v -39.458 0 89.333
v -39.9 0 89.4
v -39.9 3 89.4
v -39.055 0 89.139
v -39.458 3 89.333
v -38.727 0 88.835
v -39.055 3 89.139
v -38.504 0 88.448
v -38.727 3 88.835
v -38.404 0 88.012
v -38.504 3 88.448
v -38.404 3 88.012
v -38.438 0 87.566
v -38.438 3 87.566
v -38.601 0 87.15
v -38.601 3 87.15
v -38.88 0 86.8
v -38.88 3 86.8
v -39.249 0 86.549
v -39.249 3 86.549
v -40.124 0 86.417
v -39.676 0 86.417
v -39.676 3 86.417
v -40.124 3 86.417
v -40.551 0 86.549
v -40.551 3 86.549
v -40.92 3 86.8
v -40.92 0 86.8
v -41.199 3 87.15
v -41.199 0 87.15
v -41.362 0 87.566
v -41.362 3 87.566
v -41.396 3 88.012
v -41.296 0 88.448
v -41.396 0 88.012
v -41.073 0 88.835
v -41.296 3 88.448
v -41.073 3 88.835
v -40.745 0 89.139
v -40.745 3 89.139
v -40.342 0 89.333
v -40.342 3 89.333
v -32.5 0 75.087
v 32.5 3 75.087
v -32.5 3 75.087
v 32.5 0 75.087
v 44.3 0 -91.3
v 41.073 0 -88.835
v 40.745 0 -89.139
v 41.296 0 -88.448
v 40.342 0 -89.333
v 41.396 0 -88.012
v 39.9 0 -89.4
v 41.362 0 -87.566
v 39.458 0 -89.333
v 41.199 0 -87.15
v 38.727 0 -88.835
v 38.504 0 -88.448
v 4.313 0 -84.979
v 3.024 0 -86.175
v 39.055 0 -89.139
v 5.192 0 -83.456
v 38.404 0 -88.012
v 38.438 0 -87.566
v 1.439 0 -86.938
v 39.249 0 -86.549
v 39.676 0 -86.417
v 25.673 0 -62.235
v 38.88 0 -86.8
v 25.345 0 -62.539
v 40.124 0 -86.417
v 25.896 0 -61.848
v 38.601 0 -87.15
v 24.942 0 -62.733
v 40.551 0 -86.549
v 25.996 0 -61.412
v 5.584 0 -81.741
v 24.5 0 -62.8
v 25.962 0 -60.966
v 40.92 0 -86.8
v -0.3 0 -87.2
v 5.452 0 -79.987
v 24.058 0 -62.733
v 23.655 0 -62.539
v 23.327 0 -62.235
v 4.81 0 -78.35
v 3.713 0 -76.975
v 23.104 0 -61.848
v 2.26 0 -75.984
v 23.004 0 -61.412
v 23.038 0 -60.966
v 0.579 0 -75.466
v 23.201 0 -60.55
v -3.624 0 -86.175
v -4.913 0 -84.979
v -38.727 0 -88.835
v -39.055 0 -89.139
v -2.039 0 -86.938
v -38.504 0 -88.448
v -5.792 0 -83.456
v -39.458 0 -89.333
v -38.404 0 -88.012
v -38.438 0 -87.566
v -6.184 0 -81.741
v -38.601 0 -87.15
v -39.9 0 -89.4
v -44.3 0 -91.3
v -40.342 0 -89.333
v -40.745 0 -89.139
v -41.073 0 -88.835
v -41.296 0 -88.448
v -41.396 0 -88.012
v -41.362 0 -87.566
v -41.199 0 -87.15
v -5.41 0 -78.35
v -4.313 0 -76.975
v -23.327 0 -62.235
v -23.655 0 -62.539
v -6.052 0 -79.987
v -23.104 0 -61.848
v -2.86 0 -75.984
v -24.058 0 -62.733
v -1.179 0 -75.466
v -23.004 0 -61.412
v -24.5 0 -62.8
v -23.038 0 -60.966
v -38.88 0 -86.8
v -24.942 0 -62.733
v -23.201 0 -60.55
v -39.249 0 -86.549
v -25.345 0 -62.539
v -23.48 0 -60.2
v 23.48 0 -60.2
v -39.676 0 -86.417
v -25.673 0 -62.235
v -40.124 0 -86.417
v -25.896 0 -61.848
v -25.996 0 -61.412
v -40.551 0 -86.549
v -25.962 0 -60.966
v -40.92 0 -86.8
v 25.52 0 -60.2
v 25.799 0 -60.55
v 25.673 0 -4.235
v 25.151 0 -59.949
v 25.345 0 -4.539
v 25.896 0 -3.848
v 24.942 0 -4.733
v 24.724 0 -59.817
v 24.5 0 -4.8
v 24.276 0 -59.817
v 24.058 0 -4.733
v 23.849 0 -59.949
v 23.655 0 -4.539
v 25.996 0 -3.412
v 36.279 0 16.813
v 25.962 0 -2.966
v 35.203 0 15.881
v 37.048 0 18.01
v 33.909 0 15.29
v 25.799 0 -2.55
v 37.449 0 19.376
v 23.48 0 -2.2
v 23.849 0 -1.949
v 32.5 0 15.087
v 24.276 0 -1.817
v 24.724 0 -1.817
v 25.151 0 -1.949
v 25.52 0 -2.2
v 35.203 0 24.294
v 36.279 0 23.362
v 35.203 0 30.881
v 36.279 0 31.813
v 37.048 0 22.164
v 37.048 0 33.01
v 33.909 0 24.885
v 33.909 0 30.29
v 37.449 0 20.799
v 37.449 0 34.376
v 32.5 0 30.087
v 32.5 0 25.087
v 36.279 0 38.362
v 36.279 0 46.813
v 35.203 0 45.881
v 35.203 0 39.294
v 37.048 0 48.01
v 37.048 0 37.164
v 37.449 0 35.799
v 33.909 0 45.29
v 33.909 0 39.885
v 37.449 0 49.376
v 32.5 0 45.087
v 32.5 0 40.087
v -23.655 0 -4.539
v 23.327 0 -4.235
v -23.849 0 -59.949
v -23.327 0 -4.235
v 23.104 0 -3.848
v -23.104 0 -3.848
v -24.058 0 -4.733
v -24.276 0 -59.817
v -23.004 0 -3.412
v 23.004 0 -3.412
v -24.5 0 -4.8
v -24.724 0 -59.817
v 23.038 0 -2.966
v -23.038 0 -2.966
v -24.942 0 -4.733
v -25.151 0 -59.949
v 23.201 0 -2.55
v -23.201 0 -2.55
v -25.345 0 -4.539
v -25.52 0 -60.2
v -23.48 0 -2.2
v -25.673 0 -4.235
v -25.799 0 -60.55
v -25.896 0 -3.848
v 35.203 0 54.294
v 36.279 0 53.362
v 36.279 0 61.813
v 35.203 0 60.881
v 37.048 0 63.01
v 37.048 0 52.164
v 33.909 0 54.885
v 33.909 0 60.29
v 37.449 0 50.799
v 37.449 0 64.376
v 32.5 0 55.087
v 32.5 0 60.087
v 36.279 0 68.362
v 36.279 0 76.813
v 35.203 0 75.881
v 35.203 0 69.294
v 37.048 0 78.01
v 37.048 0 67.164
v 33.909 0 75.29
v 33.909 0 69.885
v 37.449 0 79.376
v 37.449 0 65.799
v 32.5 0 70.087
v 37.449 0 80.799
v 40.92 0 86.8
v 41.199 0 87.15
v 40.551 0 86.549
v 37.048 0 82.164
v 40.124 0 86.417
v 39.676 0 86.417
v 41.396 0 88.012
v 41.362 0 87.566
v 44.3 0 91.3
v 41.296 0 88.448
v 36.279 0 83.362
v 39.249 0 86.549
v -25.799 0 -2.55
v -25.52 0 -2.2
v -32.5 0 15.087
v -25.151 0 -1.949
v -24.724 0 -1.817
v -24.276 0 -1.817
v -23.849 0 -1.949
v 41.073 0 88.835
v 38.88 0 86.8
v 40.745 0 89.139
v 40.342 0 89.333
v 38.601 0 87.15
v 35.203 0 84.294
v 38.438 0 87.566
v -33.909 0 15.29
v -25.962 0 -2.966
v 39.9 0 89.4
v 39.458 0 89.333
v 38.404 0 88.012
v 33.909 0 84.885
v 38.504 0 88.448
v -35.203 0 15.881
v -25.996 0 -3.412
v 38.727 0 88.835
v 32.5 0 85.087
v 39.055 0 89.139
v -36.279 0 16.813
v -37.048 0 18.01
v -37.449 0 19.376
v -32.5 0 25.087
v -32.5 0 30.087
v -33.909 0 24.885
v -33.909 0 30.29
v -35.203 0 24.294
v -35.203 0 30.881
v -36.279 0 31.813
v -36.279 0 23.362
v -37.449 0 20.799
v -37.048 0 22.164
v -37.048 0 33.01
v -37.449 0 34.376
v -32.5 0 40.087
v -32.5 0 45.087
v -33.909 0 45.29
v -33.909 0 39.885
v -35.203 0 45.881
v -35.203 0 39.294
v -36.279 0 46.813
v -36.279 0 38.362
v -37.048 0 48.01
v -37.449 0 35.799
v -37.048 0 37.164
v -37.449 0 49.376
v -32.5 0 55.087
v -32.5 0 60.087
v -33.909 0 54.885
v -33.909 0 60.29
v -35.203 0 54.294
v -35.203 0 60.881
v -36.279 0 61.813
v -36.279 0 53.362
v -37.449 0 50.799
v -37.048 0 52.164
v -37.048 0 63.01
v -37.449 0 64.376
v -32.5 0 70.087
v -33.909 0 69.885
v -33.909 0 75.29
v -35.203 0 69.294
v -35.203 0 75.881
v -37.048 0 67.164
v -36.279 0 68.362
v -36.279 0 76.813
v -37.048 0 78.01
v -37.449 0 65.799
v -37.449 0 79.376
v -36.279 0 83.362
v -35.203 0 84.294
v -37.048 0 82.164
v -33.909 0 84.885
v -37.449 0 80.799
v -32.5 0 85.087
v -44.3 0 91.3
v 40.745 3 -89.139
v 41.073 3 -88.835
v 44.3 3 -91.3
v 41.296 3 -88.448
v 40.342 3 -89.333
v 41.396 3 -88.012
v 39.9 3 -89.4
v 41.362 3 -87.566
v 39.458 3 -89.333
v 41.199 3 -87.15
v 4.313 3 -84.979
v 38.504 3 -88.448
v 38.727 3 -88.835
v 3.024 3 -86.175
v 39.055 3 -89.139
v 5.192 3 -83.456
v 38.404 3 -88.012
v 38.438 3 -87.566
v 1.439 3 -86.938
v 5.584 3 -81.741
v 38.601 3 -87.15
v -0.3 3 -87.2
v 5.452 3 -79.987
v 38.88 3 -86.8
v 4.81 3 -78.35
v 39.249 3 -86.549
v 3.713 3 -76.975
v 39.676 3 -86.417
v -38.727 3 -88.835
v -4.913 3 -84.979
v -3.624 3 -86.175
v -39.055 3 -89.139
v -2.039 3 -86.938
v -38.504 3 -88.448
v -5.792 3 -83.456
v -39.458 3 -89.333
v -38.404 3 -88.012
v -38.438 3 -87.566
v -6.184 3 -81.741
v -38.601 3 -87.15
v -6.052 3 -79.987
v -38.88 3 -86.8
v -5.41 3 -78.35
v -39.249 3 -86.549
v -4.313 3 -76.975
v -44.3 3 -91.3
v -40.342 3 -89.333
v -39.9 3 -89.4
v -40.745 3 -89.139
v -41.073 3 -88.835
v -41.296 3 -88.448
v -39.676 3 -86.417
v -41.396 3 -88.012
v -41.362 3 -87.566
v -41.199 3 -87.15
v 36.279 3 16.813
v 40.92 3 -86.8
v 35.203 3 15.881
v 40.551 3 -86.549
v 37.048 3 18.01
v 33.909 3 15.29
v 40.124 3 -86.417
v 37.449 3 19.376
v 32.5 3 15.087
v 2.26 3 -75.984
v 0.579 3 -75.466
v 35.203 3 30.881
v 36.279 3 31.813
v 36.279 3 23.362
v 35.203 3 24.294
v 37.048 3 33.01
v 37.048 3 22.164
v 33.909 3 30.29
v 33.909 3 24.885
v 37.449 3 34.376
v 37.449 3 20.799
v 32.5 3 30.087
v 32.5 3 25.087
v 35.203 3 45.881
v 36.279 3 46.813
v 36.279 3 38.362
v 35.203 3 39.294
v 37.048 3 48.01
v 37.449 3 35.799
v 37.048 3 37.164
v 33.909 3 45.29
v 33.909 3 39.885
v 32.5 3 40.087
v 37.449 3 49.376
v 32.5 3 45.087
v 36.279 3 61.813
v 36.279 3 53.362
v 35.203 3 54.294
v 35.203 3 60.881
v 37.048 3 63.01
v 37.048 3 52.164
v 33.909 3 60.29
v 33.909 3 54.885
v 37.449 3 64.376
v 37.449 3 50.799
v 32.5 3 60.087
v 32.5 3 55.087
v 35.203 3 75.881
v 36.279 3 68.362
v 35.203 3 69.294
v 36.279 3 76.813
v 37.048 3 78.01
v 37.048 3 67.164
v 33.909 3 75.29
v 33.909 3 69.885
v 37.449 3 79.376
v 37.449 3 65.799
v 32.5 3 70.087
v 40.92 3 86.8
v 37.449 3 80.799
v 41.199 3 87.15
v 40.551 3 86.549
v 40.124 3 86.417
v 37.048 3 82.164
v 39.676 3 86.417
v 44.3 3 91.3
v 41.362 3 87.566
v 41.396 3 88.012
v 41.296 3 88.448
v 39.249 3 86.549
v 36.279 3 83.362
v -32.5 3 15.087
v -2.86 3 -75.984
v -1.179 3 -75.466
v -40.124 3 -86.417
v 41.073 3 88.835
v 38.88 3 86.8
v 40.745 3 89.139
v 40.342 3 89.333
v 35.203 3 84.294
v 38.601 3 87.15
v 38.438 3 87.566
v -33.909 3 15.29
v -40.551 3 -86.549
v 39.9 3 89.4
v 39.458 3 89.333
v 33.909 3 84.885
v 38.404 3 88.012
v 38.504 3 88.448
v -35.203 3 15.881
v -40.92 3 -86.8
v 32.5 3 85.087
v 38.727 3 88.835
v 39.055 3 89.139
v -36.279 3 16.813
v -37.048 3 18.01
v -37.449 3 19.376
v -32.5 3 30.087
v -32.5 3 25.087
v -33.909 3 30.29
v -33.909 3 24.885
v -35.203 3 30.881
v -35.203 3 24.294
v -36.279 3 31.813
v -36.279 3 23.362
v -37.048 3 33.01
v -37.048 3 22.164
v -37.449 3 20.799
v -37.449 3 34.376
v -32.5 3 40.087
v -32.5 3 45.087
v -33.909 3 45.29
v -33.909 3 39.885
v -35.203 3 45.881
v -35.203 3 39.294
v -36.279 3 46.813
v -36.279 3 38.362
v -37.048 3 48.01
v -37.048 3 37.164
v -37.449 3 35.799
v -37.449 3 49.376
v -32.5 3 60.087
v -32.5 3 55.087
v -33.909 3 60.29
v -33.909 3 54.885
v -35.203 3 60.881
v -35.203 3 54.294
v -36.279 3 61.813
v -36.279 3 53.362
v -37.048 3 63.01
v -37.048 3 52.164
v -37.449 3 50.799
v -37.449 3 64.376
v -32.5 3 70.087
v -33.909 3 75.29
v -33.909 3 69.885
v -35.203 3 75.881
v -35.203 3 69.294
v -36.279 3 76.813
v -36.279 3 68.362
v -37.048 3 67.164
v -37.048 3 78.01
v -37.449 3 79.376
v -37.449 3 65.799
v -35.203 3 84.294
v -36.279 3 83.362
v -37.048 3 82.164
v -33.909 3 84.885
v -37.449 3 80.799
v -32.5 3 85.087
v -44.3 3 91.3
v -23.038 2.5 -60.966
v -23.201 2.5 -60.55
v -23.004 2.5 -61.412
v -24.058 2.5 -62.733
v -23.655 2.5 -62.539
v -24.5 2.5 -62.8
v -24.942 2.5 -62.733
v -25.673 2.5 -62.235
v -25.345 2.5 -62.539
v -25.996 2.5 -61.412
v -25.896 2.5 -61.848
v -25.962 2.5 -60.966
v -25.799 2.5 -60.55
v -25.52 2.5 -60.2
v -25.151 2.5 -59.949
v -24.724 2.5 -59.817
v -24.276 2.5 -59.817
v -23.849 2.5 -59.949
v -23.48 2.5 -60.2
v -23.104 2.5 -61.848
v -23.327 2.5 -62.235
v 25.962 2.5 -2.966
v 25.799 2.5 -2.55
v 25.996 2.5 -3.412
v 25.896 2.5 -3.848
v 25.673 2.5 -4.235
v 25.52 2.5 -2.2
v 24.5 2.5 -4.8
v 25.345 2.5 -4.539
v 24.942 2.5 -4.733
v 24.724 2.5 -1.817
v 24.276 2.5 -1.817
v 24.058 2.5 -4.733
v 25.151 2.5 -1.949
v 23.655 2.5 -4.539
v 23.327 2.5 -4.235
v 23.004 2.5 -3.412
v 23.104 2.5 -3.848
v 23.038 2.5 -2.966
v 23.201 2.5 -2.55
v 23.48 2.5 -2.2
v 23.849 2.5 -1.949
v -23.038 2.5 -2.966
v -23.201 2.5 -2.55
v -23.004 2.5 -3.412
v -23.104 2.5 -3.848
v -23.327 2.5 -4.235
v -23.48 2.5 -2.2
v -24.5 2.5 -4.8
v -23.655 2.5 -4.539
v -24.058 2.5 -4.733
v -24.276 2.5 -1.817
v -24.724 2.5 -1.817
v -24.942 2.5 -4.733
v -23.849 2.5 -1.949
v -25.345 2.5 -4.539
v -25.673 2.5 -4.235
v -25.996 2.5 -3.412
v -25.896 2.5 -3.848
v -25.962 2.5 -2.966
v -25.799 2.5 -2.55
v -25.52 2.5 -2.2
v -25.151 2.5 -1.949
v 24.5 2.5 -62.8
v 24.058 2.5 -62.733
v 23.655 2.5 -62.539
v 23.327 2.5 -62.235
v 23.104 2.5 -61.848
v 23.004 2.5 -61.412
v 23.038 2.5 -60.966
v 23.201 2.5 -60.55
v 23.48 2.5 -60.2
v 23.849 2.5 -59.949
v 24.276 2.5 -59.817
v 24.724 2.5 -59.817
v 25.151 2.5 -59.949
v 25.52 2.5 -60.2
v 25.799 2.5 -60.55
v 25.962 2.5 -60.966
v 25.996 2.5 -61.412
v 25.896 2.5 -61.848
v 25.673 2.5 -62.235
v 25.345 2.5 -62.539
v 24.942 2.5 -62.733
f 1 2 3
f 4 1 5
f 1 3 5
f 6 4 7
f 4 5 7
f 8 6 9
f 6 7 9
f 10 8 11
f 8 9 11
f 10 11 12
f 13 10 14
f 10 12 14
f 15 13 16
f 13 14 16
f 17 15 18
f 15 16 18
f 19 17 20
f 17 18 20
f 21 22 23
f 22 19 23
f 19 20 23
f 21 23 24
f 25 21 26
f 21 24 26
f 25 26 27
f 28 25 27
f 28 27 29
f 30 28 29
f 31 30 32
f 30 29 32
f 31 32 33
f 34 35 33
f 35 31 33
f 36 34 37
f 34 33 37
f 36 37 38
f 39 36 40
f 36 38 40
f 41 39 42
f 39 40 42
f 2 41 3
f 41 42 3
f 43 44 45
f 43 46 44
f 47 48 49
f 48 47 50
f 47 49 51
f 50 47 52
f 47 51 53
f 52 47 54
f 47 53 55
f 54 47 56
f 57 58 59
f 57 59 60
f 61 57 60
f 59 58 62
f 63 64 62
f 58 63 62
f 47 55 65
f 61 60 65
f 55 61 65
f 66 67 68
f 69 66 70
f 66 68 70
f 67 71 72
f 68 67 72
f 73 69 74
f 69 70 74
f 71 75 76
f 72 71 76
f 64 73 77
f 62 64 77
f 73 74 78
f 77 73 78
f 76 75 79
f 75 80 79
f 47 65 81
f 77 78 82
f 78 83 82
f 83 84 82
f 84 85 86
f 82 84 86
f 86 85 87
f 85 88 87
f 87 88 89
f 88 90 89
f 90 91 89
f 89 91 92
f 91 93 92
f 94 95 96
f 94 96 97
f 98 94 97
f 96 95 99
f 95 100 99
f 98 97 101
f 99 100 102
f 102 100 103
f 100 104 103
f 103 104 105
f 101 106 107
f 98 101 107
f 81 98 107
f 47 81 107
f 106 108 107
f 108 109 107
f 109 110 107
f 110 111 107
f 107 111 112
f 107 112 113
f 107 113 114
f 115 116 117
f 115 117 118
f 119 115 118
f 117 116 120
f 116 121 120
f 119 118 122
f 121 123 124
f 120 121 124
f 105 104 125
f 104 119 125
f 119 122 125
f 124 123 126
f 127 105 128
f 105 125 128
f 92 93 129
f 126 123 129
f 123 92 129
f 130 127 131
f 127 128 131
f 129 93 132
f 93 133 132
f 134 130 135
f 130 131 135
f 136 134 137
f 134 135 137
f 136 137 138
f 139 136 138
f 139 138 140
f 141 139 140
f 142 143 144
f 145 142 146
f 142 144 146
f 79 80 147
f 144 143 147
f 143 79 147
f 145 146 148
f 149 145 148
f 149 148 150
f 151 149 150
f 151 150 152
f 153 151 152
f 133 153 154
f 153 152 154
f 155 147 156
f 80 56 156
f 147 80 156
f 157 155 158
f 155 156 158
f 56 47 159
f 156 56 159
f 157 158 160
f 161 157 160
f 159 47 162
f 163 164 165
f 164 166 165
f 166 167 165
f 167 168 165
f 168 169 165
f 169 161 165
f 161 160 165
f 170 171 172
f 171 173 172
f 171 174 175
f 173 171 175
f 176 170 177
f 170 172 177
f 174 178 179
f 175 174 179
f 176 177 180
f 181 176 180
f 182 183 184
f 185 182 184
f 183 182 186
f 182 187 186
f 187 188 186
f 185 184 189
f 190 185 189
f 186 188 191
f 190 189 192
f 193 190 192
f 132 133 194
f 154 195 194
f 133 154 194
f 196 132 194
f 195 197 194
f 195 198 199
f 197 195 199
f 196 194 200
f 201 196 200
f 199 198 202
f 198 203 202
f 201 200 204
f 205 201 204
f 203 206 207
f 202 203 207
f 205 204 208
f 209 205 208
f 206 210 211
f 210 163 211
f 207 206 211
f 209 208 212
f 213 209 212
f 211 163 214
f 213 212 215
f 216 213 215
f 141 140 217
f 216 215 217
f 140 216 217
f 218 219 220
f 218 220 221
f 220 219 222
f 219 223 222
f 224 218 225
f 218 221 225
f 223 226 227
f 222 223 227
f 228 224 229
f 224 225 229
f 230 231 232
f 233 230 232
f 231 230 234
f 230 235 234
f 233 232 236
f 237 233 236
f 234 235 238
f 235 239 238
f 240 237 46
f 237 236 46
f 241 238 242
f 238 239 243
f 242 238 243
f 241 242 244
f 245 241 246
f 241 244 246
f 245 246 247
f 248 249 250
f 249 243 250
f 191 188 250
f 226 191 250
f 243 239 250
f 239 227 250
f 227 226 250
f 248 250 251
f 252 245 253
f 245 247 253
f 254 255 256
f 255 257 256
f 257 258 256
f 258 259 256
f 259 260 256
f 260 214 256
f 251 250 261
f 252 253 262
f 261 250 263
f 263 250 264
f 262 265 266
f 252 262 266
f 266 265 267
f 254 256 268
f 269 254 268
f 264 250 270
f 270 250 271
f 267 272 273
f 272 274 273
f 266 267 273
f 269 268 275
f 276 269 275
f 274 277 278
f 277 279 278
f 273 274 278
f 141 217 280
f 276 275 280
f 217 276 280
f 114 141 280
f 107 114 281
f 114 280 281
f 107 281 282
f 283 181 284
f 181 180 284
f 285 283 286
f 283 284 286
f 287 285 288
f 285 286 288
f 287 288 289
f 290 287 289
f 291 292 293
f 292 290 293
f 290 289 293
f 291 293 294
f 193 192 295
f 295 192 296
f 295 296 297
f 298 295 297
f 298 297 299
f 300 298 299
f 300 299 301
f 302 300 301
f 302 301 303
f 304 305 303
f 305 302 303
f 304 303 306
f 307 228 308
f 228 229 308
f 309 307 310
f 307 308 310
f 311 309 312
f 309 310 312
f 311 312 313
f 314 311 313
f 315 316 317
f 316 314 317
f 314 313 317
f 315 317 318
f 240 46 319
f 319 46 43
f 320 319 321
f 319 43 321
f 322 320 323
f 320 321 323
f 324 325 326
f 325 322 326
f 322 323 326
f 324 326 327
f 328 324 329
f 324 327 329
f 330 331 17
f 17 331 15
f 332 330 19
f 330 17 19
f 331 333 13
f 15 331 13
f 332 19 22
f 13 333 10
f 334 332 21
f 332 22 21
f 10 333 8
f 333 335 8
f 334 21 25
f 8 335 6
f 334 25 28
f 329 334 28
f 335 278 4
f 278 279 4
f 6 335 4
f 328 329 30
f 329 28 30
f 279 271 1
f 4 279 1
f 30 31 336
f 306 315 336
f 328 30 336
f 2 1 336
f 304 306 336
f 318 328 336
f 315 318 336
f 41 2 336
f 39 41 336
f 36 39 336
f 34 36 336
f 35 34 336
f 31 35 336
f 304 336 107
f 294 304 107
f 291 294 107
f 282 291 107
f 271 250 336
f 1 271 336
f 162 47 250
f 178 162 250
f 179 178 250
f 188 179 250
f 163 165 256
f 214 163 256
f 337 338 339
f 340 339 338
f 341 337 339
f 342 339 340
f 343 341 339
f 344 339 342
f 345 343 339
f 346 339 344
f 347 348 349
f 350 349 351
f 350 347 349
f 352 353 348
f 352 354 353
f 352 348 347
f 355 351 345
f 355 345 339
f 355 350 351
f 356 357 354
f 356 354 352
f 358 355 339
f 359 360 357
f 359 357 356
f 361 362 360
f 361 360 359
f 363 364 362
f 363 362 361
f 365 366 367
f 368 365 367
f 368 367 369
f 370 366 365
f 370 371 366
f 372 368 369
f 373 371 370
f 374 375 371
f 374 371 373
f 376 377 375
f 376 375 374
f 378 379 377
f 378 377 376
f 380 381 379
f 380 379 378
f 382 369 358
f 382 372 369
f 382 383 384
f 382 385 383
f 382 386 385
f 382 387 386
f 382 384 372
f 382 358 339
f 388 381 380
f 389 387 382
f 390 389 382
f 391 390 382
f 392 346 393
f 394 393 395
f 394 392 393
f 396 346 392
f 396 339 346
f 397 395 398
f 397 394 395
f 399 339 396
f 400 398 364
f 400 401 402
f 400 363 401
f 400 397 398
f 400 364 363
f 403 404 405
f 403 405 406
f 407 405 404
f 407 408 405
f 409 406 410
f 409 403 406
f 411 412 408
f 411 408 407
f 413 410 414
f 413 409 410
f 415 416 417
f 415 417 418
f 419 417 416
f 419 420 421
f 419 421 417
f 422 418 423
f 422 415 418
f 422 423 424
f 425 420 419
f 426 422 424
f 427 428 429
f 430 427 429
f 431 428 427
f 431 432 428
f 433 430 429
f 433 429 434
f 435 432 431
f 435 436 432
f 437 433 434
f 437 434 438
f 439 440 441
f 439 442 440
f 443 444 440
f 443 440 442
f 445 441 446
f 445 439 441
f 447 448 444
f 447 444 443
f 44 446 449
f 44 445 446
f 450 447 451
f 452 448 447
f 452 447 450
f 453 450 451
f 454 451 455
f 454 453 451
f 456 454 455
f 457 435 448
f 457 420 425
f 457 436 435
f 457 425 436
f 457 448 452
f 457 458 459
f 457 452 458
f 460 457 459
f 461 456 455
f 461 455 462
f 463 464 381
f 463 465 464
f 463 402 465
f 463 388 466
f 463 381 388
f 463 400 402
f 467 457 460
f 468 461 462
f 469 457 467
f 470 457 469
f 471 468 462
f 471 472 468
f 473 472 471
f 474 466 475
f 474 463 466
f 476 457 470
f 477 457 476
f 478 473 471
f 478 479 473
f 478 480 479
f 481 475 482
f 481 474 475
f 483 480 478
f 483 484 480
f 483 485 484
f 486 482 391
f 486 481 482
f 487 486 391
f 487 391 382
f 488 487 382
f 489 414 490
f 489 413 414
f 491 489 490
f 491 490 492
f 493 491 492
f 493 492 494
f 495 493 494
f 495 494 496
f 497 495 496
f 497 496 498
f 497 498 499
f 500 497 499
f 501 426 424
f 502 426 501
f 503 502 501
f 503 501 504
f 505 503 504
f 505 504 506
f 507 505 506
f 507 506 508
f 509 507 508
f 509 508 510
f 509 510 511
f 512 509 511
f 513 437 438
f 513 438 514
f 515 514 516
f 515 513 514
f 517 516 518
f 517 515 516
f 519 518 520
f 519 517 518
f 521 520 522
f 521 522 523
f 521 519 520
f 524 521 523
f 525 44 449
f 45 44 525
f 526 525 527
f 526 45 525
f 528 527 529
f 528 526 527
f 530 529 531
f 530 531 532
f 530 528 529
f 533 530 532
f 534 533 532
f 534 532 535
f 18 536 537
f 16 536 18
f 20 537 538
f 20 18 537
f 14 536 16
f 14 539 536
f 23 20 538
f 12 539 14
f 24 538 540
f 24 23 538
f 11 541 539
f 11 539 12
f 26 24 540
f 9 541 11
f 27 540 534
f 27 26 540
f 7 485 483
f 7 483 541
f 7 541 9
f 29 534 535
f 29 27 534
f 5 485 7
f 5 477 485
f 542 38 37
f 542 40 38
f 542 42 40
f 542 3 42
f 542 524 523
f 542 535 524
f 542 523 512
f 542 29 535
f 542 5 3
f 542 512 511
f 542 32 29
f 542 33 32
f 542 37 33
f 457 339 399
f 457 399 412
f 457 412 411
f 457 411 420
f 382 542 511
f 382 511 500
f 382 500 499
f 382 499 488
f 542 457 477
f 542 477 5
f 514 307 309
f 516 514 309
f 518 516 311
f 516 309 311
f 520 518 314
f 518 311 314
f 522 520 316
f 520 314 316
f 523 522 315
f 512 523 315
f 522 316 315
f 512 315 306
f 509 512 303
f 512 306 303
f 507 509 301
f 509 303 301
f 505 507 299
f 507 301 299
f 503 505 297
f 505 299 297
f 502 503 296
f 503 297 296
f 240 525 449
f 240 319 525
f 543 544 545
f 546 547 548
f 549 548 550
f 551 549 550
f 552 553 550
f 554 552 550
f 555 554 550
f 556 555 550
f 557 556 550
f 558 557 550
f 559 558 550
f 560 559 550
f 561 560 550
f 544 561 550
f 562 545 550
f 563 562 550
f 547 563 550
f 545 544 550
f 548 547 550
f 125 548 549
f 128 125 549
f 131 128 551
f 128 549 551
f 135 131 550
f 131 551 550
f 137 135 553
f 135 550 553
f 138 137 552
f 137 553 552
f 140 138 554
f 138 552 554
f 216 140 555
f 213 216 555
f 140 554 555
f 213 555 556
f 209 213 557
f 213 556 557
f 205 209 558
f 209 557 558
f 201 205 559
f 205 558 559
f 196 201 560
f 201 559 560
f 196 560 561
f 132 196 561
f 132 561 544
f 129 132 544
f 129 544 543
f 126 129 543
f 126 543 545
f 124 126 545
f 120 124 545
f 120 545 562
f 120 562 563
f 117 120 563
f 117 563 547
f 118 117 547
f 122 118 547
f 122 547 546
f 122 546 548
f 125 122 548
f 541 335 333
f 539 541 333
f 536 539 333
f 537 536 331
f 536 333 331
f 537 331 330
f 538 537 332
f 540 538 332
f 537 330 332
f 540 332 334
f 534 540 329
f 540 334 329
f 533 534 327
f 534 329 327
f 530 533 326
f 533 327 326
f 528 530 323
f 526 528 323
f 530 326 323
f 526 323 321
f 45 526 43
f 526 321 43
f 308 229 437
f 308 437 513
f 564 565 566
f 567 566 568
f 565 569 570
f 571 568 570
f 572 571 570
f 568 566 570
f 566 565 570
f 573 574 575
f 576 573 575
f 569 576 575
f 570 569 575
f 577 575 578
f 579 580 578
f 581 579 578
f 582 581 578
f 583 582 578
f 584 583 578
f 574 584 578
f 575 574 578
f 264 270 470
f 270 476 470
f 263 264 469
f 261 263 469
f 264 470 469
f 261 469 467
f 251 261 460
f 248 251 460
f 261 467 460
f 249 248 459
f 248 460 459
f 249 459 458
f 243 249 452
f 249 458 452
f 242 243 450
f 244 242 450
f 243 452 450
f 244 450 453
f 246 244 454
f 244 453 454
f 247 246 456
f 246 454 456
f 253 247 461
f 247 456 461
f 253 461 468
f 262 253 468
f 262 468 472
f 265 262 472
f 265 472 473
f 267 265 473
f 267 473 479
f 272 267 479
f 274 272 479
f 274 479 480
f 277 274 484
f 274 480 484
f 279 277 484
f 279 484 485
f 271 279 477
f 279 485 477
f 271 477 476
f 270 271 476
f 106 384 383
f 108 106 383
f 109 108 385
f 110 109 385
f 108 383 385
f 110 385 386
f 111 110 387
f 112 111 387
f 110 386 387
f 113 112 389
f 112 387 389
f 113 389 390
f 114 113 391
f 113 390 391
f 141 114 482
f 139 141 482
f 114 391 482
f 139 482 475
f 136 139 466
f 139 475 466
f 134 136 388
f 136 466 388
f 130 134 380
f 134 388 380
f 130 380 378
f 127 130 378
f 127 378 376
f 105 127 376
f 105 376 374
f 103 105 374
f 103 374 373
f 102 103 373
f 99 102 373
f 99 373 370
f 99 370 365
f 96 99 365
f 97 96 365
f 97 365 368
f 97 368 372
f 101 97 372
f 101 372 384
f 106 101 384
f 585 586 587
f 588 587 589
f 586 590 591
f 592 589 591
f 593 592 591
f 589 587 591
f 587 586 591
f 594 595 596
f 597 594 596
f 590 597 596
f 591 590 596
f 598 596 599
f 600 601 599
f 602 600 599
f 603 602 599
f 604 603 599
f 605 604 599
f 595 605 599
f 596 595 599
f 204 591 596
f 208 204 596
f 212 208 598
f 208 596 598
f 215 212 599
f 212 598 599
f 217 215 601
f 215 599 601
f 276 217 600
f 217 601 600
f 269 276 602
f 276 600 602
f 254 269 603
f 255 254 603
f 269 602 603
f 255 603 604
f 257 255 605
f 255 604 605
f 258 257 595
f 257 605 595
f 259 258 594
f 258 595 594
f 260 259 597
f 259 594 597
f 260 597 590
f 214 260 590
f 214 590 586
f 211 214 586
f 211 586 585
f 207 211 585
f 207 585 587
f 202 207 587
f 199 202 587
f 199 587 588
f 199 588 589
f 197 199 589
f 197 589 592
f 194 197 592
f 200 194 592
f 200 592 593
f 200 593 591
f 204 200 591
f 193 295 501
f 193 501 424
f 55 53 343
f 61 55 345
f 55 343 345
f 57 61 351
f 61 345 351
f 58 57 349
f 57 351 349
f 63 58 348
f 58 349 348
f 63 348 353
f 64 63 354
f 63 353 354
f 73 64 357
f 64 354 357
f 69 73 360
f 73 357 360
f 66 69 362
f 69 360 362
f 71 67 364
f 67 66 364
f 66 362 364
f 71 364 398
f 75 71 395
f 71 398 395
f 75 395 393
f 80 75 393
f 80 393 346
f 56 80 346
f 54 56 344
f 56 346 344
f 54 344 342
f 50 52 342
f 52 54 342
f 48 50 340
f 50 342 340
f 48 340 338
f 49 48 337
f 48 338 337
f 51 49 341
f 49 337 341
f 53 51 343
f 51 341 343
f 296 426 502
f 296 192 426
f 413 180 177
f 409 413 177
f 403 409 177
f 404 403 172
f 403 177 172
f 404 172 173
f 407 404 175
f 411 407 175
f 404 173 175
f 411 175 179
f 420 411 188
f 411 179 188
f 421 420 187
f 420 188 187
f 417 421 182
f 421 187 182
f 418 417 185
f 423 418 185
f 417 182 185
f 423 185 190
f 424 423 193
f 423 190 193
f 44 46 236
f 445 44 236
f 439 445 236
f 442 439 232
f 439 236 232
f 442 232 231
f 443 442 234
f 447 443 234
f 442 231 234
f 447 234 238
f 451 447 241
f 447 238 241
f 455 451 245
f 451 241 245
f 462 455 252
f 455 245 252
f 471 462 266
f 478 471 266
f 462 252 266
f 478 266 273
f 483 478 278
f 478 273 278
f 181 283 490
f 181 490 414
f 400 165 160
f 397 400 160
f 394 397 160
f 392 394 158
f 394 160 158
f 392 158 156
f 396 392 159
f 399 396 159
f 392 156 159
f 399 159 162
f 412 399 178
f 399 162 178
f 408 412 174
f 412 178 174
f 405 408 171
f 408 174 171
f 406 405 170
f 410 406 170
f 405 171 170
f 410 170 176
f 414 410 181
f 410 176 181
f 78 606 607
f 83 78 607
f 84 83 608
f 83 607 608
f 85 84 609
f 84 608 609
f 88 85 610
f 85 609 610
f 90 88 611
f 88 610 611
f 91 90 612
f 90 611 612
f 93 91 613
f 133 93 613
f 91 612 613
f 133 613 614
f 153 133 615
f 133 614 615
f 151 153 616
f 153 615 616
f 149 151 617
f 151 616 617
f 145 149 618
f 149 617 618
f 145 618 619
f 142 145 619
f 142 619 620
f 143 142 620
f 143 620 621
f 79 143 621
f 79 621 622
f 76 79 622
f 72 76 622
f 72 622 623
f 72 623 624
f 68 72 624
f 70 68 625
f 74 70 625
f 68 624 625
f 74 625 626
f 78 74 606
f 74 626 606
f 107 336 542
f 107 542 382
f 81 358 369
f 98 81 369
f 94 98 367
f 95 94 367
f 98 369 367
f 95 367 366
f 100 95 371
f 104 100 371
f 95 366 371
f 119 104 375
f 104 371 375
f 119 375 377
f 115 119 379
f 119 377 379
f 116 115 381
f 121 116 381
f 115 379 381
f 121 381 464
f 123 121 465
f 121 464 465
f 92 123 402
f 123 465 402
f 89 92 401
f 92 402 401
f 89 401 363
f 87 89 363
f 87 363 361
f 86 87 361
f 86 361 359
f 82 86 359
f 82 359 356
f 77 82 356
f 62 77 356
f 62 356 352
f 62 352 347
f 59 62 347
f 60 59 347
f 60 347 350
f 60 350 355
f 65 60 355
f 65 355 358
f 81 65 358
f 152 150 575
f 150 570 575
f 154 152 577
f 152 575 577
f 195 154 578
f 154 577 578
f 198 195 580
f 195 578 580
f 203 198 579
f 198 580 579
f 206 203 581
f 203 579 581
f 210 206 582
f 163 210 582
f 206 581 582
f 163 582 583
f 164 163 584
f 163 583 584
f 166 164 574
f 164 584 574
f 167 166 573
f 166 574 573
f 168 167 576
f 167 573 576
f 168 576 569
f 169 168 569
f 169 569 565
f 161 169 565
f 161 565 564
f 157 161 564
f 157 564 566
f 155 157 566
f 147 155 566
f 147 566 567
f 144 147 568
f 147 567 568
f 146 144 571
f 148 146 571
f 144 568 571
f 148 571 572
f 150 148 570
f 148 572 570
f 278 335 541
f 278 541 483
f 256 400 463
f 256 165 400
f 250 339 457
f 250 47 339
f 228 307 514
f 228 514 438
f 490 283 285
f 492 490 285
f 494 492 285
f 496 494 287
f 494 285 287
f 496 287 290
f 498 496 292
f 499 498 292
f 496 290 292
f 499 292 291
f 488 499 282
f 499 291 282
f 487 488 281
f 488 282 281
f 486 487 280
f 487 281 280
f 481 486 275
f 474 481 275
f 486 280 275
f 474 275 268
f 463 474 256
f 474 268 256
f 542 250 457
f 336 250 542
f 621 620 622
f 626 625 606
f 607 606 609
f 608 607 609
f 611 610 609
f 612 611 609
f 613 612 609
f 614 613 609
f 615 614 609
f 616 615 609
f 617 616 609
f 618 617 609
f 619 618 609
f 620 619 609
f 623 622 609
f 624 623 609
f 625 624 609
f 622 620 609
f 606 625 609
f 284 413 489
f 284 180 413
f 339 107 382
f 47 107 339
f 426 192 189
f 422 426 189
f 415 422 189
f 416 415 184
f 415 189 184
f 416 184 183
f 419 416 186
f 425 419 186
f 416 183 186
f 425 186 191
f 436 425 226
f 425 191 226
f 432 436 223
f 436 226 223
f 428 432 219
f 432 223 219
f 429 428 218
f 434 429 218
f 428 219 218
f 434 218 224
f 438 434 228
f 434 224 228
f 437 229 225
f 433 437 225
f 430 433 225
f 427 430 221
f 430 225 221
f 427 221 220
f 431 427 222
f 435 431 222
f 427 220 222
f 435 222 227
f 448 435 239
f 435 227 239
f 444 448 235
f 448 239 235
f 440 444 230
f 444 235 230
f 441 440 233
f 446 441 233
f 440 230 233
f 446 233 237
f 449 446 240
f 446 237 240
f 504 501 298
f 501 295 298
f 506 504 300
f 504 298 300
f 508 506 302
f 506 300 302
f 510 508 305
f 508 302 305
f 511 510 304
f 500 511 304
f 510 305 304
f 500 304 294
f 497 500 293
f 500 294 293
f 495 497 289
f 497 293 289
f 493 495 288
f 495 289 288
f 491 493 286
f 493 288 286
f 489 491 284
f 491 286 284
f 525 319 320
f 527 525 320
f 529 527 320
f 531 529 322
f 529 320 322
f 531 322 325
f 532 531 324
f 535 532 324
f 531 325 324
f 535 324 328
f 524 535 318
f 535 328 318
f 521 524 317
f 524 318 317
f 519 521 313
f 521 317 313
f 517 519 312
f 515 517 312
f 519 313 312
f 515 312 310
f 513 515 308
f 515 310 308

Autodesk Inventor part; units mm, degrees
ref_plane "YZ Plane" through (0, 0, 0) normal (1, 0, 0) x (0, 1, 0)
ref_plane "XZ Plane" through (0, 0, 0) normal (0, 1, 0) x (-1, 0, 0)
ref_plane "XY Plane" through (0, 0, 0) normal (0, 0, 1) x (1, 0, 0)
sketch "Skizze1" plane through (0, 0, 0) normal (0, 1, 0) x (-1, 0, 0)
  line L0 (-44.3, 91.3) -> (44.3, 91.3)
  line L1 (44.3, 91.3) -> (44.3, -91.3)
  line L2 (44.3, -91.3) -> (-44.3, -91.3)
  line L3 (-44.3, -91.3) -> (-44.3, 91.3)
  line L4 (-44.3, 91.3) -> (44.3, -91.3) construction
  line L5 (44.3, 91.3) -> (-44.3, -91.3) construction
  point P0 (0, 0)
  dimension "d0" = 88.6
  dimension "d1" = 182.6
extrude "Extrusion1" add sketch "Skizze1" along normal blind 3
sketch "Skizze2" plane through (0, 0, 0) normal (0, -1, 0) x (1, 0, 0)
  line L0 (-44.3, -91.3) -> (44.3, -91.3) projected
  line L1 (0, -91.3) -> (0, 91.3)
  line L2 (44.3, 91.3) -> (-44.3, 91.3) projected
  line L3 (-24.5, -61.3) -> (24.5, -61.3)
  line L4 (24.5, -61.3) -> (24.5, -3.3)
  line L5 (24.5, -3.3) -> (-24.5, -3.3)
  line L6 (-24.5, -3.3) -> (-24.5, -61.3)
  line L7 (-24.5, -61.3) -> (24.5, -3.3) construction
  line L8 (24.5, -61.3) -> (-24.5, -3.3) construction
  point P0 (0, 0)
  point P1 (0, -32.3)
  dimension "d5" = 49
  dimension "d6" = 58
  dimension "d7" = 30
hole "Bohrung1" at (-24.5, 0, -61.3) at (24.5, 0, -61.3) at (24.5, 0, -3.3) at (-24.5, 0, -3.3) direction (0, 1, 0) diameter 3 depth 2.5
sketch "Skizze3" plane through (0, 0, 0) normal (0, -1, 0) x (1, 0, 0)
  line L0 (32.5, 15.0873) -> (-32.5, 15.0873)
  line L1 (-37.5, 20.0873) -> (-37.5, 20.0873)
  line L2 (-32.5, 25.0873) -> (32.5, 25.0873)
  line L3 (37.5, 20.0873) -> (37.5, 20.0873)
  line L4 (37.5, 15.0873) -> (-37.5, 25.0873) construction
  line L5 (-37.5, 15.0873) -> (37.5, 25.0873) construction
  arc A0 (-37.5, 20.0873) -> (-32.5, 15.0873) centre (-32.5, 20.0873) ccw
  arc A1 (-32.5, 25.0873) -> (-37.5, 20.0873) centre (-32.5, 20.0873) ccw
  arc A2 (32.5, 15.0873) -> (37.5, 20.0873) centre (32.5, 20.0873) ccw
  arc A3 (37.5, 20.0873) -> (32.5, 25.0873) centre (32.5, 20.0873) ccw
  point P0 (0, 0)
  point P1 (0, 20.0873)
  dimension "d15" = 75
  dimension "d16" = 10
  dimension "d18" = 5
  dimension "d19" = 5
  dimension "d20" = 5
extrude "Extrusion2" cut sketch "Skizze3" against normal blind 10
pattern_linear "Rechteckige Anordnung1" count 5 spacing 15 along (0, 0, 1) of "Extrusion2"
hole "Bohrung2" at (-39.9, 0, -87.9) direction (0, 1, 0) diameter 3 depth 8 tip angle 118
mirror "Spiegeln1" about plane through (0, 0, 0) normal (1, 0, 0) of "Bohrung2"
mirror "Spiegeln2" about plane through (0, 0, 0) normal (0, 0, 1) of "Bohrung2", "Spiegeln1"
hole "Bohrung3" at (-0.3, 0, -81.3) direction (0, 1, 0) diameter 11.8 depth 8 tip angle 118
properties part number "RaspberryBox_Backplate"
